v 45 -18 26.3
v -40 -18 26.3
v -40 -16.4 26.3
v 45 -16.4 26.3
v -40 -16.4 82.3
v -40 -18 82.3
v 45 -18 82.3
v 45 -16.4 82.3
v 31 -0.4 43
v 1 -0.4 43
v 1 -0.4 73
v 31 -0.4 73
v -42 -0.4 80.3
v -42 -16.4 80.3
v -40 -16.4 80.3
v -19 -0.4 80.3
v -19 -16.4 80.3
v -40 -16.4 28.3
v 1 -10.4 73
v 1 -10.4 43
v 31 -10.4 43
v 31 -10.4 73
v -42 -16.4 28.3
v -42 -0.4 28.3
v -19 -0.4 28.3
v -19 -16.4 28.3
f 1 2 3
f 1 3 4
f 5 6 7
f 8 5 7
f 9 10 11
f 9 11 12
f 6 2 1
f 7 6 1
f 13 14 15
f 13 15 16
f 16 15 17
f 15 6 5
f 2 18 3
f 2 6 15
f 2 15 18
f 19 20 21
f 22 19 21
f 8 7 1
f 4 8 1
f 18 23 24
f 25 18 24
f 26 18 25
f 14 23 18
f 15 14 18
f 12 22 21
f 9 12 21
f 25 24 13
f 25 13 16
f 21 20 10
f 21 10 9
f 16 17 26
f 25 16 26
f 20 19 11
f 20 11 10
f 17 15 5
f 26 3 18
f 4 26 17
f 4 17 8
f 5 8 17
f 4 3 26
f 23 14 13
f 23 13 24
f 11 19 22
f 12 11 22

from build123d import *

# Parameters (mm, degrees)
SKETCH1_W              = 85
SKETCH1_H              = 56
PI_4_PCB_DEPTH         = 1.6
SKETCH2_W              = 23
SKETCH2_H              = 52
USB_AND_ETHERNET_DEPTH = 16
SKETCH3_W              = 30
SKETCH3_H              = 30
FAN_DEPTH              = 10


with BuildPart() as part:
    # Sketch1 → Pi 4 PCB (new body)
    with BuildSketch(Plane(origin=(0, -18, 0), x_dir=(1, 0, 0), z_dir=(0, 1, 0))):
        with Locations((2.5, -54.3)):
            Rectangle(SKETCH1_W, SKETCH1_H)
    extrude(amount=PI_4_PCB_DEPTH)

    # Sketch2 → USB And Ethernet (add)
    with BuildSketch(Plane(origin=(0, -16.4, 0), x_dir=(1, 0, 0), z_dir=(0, 1, 0))):
        with Locations((-30.5, -54.3)):
            Rectangle(SKETCH2_W, SKETCH2_H)
    extrude(amount=USB_AND_ETHERNET_DEPTH)


with BuildPart() as body_2:
    # Sketch3 → Fan (new body)
    with BuildSketch(Plane(origin=(0, -10.4, 0), x_dir=(1, 0, 0), z_dir=(0, 1, 0))):
        with Locations((16, -58)):
            Rectangle(SKETCH3_W, SKETCH3_H)
    extrude(amount=FAN_DEPTH)


solid = Compound([part.part, body_2.part])
